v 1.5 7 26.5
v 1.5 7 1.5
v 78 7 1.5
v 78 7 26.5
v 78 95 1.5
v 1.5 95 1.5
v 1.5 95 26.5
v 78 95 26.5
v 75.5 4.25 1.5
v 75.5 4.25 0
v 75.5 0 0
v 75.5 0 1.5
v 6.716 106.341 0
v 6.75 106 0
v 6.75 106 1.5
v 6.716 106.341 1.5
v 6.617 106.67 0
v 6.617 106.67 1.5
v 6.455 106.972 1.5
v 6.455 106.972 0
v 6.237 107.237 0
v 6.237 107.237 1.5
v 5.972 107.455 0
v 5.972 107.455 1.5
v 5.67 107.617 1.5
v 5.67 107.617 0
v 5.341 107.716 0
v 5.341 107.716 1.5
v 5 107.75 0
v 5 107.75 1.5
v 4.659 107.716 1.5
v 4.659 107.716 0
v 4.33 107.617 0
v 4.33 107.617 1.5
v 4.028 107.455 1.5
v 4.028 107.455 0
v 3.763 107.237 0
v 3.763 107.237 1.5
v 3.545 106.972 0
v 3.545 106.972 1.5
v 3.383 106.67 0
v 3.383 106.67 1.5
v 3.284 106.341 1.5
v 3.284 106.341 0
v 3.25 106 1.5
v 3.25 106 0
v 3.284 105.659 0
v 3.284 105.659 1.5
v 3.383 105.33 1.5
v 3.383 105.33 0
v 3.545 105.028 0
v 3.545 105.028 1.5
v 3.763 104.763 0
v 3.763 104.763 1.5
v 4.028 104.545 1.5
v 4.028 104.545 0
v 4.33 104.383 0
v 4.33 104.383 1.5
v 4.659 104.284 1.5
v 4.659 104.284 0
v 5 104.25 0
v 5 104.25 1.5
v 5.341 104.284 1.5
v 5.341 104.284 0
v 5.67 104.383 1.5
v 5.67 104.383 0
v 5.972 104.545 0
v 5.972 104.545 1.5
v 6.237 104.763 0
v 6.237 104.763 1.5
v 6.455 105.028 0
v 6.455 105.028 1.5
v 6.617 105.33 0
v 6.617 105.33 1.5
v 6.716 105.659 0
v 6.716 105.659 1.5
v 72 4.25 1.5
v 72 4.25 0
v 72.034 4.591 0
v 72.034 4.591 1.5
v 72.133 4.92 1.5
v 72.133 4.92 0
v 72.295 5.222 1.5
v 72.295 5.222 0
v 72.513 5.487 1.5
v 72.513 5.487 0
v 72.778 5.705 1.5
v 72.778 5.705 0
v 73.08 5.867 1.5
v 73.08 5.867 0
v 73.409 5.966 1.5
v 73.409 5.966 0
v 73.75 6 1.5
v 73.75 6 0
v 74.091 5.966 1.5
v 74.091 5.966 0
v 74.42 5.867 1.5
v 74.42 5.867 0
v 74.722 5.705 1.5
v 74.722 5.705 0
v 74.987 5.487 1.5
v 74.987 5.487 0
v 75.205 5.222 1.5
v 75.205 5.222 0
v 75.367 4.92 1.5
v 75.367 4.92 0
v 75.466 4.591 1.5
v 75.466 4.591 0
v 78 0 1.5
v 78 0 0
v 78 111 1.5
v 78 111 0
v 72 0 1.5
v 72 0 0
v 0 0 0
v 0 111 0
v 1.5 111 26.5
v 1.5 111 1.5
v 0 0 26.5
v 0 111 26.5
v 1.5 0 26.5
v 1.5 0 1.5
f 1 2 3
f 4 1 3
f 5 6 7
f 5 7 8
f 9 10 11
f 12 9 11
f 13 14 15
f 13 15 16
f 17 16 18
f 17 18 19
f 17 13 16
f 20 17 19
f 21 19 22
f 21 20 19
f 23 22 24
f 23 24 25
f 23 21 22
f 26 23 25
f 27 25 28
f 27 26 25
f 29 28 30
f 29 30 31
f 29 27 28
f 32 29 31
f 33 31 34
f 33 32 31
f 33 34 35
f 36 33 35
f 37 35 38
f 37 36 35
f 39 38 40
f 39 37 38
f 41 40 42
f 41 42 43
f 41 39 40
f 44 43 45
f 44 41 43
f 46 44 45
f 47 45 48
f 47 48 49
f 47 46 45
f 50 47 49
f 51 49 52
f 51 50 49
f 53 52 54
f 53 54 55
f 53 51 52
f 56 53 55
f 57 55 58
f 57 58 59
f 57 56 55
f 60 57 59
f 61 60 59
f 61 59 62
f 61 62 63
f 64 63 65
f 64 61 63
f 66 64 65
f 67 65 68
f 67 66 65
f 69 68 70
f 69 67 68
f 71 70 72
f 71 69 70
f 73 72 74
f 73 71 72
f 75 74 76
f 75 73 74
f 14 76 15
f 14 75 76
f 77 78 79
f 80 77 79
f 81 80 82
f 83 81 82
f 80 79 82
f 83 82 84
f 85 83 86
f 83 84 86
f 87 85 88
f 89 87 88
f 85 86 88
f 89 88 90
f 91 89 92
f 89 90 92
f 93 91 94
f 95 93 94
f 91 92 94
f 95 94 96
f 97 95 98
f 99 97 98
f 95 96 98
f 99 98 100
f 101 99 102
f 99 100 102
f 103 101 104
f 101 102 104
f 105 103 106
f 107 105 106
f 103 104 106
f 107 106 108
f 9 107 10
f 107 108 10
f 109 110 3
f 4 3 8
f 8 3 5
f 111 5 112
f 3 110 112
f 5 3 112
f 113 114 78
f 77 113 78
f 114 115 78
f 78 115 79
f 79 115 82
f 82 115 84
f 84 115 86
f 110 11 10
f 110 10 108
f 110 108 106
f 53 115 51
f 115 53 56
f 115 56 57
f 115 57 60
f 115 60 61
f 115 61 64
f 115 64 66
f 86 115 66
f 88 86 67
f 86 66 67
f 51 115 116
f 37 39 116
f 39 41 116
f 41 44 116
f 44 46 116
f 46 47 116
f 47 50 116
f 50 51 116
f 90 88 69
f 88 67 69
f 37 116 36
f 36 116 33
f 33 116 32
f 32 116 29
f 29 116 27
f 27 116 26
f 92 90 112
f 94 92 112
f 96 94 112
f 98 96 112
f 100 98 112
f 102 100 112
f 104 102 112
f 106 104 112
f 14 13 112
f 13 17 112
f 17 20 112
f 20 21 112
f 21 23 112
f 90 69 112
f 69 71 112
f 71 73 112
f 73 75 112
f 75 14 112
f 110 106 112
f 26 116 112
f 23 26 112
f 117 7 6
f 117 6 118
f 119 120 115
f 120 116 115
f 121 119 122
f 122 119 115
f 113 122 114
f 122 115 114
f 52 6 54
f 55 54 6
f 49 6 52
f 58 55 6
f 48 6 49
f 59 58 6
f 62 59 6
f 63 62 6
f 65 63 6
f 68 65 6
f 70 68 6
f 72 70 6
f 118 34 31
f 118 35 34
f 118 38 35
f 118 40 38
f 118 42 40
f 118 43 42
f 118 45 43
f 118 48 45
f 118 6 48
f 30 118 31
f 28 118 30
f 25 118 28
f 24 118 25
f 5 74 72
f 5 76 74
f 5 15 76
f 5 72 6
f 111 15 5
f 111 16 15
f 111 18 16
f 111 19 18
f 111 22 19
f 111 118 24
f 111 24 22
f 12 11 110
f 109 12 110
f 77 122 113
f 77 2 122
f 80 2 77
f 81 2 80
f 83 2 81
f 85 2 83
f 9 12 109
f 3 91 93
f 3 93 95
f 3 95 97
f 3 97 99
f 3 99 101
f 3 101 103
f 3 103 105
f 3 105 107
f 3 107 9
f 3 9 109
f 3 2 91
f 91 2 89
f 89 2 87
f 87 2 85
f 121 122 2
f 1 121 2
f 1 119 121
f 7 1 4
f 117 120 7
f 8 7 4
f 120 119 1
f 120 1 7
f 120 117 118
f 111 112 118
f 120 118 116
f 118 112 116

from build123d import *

# Parameters (mm, degrees)
ESQUISSE1_R        = 1.75
BOSS_EXTRU_1_DEPTH = 1.5
ESQUISSE2_W        = 76.5
ESQUISSE2_H        = 88
BOSS_EXTRU_2_DEPTH = 25


with BuildPart() as part:
    # Esquisse1 → Boss.-Extru.1 (new body)
    with BuildSketch(Plane.XY):
        with BuildLine():
            Line((72, 0), (72, 4.25))
            ThreePointArc((72, 4.25), (73.75, 6), (75.5, 4.25))
            Line((75.5, 4.25), (75.5, 0))
            Line((75.5, 0), (78, 0))
            Line((78, 0), (78, 111))
            Line((78, 111), (0, 111))
            Line((0, 111), (0, 0))
            Line((0, 0), (72, 0))
        make_face()
        with Locations((5, 106)):
            Circle(ESQUISSE1_R, mode=Mode.SUBTRACT)
    extrude(amount=BOSS_EXTRU_1_DEPTH)

    # Esquisse2 → Boss.-Extru.2 (add)
    with BuildSketch(Plane.XY.offset(1.5)):
        with Locations((39.75, 51)):
            Rectangle(ESQUISSE2_W, ESQUISSE2_H)
        Polygon((1.5, 111), (0, 111), (0, 0), (1.5, 0), (1.5, 7), (1.5, 95), align=None)
    extrude(amount=BOSS_EXTRU_2_DEPTH)


solid = part.part
